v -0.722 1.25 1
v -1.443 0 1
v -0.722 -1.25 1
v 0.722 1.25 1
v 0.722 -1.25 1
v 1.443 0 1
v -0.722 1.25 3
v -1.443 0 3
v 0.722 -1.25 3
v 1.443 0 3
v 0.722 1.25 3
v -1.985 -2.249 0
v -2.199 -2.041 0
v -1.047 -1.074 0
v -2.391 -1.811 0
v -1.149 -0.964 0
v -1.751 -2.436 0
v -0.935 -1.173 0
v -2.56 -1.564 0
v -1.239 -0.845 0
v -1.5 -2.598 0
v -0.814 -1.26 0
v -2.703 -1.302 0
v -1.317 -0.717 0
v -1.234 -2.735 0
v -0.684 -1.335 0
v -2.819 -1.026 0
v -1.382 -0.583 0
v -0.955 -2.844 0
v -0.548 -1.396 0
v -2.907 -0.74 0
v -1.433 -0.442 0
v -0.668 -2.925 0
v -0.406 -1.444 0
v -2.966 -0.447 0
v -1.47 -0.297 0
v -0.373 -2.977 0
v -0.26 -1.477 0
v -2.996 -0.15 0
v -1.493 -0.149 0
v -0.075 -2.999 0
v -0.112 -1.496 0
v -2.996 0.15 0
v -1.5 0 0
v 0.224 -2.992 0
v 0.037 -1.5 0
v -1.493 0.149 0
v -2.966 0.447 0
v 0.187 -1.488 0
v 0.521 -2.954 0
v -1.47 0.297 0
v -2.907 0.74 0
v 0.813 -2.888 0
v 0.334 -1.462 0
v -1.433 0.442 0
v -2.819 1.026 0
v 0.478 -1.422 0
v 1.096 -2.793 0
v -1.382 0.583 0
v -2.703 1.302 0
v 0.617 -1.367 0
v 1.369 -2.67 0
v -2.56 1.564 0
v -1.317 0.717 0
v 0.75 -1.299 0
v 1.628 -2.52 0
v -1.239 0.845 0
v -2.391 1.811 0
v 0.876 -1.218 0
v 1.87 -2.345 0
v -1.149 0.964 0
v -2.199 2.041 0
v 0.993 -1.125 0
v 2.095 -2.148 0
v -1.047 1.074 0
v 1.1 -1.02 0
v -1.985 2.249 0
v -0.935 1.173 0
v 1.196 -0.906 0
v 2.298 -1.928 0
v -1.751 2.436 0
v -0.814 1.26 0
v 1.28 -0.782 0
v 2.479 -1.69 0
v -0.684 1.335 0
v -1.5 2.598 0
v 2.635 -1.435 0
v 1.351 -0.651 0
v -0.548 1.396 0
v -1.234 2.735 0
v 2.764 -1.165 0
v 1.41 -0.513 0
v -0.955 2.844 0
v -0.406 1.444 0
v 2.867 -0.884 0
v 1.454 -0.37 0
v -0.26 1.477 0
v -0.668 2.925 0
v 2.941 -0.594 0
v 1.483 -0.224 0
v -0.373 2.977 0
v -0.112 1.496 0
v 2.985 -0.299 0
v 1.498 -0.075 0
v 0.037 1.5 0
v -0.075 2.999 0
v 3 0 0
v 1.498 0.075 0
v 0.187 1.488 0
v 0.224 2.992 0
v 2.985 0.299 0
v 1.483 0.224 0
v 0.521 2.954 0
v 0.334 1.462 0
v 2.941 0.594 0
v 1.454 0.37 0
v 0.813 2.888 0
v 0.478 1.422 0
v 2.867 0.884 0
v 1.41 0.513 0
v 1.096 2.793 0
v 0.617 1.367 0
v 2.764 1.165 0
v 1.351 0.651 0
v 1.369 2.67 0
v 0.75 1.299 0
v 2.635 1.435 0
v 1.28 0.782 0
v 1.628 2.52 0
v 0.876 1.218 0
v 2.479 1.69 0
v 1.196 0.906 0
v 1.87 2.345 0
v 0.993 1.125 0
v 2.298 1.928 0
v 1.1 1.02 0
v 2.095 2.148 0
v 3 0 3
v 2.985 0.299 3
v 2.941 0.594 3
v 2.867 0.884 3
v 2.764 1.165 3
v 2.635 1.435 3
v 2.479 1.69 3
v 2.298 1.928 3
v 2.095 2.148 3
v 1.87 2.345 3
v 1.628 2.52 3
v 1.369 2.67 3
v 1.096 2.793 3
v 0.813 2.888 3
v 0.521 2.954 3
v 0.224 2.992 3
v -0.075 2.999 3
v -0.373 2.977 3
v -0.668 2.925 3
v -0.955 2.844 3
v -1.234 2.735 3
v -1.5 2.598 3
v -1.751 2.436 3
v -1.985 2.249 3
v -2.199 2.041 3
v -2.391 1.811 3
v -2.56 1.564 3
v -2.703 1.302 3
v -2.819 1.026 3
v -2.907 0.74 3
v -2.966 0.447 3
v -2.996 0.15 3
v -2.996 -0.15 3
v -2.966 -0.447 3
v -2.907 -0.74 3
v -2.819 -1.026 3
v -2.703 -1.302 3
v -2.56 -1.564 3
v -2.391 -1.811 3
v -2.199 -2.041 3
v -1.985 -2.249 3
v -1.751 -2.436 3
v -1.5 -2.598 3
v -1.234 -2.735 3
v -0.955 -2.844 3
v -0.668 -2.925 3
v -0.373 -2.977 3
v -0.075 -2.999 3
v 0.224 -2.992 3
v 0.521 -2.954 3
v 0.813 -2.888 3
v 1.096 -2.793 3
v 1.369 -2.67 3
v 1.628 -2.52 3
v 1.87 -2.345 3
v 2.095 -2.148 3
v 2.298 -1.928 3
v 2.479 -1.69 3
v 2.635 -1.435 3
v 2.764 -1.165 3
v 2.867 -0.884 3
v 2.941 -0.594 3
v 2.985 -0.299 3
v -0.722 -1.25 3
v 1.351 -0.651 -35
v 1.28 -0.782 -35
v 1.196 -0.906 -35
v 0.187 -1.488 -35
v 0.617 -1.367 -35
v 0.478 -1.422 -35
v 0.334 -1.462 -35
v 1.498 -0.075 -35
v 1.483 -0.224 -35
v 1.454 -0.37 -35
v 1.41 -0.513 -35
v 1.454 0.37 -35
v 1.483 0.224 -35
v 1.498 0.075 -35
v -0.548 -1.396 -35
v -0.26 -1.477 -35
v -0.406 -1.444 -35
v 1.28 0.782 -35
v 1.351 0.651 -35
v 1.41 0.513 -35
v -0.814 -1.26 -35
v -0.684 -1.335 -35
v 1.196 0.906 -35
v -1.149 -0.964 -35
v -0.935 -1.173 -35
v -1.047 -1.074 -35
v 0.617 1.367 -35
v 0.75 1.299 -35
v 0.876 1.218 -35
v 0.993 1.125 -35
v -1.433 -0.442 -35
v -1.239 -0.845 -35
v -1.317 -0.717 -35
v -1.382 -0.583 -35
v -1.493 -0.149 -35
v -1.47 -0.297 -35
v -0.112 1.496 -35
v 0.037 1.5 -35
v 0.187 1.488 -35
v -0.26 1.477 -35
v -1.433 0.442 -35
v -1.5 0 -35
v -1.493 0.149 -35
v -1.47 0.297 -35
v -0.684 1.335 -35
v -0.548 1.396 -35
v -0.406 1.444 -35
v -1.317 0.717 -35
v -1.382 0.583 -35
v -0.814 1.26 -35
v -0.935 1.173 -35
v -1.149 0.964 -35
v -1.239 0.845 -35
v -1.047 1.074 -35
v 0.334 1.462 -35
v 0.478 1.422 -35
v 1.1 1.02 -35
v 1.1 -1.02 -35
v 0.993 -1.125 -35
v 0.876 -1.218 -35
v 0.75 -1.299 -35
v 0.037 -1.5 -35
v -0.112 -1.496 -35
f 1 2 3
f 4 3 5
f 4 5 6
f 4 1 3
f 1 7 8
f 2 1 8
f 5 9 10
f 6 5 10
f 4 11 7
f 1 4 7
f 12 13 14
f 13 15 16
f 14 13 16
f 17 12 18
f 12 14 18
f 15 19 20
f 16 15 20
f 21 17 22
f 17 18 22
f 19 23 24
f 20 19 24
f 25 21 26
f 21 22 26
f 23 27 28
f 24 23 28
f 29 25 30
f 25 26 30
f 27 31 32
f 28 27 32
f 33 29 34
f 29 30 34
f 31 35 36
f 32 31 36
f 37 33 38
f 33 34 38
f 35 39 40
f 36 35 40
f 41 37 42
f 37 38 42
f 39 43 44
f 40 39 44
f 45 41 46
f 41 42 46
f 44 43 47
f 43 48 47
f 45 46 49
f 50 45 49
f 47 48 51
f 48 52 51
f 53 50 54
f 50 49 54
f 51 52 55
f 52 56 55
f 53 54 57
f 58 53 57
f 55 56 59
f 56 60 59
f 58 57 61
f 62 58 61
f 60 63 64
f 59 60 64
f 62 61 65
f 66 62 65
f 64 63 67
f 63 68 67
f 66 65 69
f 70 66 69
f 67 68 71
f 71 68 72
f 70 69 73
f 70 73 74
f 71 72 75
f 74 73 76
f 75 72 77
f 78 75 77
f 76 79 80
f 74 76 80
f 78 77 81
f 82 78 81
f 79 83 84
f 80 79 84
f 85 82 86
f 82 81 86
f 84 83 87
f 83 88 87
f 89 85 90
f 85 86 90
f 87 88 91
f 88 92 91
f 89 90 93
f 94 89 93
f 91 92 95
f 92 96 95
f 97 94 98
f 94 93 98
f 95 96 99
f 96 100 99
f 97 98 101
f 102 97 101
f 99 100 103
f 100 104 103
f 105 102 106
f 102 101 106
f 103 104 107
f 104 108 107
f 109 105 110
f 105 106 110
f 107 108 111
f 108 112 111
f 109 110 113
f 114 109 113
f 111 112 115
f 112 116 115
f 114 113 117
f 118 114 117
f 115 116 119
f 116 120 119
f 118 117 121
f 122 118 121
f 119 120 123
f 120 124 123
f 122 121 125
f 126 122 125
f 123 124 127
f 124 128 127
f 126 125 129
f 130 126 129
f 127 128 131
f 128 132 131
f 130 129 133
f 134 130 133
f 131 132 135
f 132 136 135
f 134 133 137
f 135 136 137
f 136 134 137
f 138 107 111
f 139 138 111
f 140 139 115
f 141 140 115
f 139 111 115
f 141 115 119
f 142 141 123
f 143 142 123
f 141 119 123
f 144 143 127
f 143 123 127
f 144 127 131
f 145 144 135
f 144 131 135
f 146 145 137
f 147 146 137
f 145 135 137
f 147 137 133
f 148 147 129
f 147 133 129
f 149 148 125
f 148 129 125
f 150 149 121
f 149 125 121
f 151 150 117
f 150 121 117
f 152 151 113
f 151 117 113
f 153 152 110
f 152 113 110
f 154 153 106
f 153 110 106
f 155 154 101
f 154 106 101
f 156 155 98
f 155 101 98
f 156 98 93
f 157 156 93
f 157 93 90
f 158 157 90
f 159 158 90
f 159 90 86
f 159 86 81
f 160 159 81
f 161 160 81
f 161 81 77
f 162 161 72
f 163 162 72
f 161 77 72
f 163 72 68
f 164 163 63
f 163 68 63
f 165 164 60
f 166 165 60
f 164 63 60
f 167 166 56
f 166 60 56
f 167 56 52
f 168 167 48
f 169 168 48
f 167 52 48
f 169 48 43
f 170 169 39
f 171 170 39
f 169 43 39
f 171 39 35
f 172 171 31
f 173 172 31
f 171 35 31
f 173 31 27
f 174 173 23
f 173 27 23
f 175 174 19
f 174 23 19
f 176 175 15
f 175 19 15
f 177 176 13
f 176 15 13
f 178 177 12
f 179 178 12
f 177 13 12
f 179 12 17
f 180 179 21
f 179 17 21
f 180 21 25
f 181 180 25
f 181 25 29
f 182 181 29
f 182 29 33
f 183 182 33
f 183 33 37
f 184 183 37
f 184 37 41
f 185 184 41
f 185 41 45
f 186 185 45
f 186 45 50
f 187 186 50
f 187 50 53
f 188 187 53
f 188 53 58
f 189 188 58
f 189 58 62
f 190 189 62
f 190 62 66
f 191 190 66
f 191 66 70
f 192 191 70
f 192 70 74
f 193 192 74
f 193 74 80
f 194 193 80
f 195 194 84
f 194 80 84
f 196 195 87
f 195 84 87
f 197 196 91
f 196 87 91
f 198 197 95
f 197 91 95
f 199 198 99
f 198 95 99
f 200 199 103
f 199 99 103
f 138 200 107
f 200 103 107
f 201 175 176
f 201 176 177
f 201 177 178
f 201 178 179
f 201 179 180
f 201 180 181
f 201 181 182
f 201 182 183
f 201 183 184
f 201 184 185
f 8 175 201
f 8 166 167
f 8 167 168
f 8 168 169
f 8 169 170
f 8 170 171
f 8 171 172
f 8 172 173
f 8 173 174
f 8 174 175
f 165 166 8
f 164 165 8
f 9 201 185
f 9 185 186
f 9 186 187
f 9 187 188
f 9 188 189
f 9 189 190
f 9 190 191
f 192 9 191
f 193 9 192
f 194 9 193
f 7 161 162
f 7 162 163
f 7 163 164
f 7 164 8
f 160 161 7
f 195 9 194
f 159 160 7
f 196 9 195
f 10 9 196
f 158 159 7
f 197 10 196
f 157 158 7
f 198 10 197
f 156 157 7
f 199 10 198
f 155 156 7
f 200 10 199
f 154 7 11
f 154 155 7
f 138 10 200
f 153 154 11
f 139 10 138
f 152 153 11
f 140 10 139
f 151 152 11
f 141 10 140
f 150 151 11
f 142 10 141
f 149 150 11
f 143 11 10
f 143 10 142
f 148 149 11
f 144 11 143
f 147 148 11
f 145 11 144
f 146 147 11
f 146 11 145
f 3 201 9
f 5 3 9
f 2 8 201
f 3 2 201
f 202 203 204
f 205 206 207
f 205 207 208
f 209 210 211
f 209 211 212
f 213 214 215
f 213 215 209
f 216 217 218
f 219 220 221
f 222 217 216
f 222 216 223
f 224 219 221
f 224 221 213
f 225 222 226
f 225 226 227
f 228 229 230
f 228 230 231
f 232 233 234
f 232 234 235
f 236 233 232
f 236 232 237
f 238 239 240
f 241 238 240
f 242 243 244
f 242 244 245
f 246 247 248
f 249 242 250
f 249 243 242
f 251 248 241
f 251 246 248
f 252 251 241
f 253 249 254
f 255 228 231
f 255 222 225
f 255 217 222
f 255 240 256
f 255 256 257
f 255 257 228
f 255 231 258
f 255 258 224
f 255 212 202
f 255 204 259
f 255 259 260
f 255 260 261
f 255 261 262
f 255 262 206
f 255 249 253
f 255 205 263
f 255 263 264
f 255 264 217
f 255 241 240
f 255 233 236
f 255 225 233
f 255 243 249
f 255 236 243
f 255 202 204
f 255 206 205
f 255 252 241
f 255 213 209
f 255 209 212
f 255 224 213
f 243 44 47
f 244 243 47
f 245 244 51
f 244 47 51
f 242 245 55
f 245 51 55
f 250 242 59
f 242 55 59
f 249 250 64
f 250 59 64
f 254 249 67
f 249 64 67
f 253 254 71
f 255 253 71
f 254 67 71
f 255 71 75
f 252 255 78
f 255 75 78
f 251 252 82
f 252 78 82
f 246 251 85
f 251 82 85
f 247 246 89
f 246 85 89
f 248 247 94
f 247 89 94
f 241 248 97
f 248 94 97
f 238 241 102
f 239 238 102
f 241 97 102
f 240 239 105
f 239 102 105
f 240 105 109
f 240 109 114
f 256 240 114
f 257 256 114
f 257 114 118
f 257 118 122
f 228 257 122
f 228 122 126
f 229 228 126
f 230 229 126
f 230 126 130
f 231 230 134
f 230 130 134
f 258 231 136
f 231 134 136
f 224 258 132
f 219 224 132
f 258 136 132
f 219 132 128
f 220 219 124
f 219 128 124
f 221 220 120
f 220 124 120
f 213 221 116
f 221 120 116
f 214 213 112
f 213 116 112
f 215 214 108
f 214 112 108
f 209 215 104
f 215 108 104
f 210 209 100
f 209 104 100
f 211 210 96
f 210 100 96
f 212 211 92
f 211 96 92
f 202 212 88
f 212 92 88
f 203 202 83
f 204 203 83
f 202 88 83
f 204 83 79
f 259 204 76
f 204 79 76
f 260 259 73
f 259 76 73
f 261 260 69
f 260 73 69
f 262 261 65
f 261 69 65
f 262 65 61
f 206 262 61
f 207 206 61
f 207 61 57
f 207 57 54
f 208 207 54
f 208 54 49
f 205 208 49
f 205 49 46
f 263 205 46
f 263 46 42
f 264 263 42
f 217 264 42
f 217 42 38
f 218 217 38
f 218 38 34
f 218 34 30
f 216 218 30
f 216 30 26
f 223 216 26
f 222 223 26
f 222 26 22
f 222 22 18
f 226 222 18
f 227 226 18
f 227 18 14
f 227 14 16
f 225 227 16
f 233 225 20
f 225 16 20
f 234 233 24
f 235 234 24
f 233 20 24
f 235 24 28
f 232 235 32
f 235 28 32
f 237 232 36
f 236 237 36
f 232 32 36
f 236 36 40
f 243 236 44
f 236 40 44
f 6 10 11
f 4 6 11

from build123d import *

# Parameters (mm, degrees)
SKETCH_5_R          = 3
EXTRUDE_1_DEPTH     = 3
CUT_EXTRUDE_1_DEPTH = 2
SKETCH_7_R          = 1.5
EXTRUDE_2_DEPTH     = 35


with BuildPart() as part:
    # ｽｹｯﾁ5 → ﾎﾞｽ - 押し出し1 (new body)
    with BuildSketch(Plane.XY):
        Circle(SKETCH_5_R)
    extrude(amount=EXTRUDE_1_DEPTH)

    # ｽｹｯﾁ6 → ｶｯﾄ - 押し出し1 (cut)
    with BuildSketch(Plane.XY.offset(3)):
        Polygon((1.443375673, 0), (0.721687836, 1.25), (-0.721687836, 1.25), (-1.443375673, 0), (-0.721687836, -1.25), (0.721687836, -1.25), align=None)
    extrude(amount=-CUT_EXTRUDE_1_DEPTH, mode=Mode.SUBTRACT)

    # ｽｹｯﾁ7 → ﾎﾞｽ - 押し出し2 (add)
    with BuildSketch(Plane(origin=(0, 0, 0), x_dir=(-1, 0, 0), z_dir=(0, 0, -1))):
        Circle(SKETCH_7_R)
    extrude(amount=EXTRUDE_2_DEPTH)


solid = part.part
